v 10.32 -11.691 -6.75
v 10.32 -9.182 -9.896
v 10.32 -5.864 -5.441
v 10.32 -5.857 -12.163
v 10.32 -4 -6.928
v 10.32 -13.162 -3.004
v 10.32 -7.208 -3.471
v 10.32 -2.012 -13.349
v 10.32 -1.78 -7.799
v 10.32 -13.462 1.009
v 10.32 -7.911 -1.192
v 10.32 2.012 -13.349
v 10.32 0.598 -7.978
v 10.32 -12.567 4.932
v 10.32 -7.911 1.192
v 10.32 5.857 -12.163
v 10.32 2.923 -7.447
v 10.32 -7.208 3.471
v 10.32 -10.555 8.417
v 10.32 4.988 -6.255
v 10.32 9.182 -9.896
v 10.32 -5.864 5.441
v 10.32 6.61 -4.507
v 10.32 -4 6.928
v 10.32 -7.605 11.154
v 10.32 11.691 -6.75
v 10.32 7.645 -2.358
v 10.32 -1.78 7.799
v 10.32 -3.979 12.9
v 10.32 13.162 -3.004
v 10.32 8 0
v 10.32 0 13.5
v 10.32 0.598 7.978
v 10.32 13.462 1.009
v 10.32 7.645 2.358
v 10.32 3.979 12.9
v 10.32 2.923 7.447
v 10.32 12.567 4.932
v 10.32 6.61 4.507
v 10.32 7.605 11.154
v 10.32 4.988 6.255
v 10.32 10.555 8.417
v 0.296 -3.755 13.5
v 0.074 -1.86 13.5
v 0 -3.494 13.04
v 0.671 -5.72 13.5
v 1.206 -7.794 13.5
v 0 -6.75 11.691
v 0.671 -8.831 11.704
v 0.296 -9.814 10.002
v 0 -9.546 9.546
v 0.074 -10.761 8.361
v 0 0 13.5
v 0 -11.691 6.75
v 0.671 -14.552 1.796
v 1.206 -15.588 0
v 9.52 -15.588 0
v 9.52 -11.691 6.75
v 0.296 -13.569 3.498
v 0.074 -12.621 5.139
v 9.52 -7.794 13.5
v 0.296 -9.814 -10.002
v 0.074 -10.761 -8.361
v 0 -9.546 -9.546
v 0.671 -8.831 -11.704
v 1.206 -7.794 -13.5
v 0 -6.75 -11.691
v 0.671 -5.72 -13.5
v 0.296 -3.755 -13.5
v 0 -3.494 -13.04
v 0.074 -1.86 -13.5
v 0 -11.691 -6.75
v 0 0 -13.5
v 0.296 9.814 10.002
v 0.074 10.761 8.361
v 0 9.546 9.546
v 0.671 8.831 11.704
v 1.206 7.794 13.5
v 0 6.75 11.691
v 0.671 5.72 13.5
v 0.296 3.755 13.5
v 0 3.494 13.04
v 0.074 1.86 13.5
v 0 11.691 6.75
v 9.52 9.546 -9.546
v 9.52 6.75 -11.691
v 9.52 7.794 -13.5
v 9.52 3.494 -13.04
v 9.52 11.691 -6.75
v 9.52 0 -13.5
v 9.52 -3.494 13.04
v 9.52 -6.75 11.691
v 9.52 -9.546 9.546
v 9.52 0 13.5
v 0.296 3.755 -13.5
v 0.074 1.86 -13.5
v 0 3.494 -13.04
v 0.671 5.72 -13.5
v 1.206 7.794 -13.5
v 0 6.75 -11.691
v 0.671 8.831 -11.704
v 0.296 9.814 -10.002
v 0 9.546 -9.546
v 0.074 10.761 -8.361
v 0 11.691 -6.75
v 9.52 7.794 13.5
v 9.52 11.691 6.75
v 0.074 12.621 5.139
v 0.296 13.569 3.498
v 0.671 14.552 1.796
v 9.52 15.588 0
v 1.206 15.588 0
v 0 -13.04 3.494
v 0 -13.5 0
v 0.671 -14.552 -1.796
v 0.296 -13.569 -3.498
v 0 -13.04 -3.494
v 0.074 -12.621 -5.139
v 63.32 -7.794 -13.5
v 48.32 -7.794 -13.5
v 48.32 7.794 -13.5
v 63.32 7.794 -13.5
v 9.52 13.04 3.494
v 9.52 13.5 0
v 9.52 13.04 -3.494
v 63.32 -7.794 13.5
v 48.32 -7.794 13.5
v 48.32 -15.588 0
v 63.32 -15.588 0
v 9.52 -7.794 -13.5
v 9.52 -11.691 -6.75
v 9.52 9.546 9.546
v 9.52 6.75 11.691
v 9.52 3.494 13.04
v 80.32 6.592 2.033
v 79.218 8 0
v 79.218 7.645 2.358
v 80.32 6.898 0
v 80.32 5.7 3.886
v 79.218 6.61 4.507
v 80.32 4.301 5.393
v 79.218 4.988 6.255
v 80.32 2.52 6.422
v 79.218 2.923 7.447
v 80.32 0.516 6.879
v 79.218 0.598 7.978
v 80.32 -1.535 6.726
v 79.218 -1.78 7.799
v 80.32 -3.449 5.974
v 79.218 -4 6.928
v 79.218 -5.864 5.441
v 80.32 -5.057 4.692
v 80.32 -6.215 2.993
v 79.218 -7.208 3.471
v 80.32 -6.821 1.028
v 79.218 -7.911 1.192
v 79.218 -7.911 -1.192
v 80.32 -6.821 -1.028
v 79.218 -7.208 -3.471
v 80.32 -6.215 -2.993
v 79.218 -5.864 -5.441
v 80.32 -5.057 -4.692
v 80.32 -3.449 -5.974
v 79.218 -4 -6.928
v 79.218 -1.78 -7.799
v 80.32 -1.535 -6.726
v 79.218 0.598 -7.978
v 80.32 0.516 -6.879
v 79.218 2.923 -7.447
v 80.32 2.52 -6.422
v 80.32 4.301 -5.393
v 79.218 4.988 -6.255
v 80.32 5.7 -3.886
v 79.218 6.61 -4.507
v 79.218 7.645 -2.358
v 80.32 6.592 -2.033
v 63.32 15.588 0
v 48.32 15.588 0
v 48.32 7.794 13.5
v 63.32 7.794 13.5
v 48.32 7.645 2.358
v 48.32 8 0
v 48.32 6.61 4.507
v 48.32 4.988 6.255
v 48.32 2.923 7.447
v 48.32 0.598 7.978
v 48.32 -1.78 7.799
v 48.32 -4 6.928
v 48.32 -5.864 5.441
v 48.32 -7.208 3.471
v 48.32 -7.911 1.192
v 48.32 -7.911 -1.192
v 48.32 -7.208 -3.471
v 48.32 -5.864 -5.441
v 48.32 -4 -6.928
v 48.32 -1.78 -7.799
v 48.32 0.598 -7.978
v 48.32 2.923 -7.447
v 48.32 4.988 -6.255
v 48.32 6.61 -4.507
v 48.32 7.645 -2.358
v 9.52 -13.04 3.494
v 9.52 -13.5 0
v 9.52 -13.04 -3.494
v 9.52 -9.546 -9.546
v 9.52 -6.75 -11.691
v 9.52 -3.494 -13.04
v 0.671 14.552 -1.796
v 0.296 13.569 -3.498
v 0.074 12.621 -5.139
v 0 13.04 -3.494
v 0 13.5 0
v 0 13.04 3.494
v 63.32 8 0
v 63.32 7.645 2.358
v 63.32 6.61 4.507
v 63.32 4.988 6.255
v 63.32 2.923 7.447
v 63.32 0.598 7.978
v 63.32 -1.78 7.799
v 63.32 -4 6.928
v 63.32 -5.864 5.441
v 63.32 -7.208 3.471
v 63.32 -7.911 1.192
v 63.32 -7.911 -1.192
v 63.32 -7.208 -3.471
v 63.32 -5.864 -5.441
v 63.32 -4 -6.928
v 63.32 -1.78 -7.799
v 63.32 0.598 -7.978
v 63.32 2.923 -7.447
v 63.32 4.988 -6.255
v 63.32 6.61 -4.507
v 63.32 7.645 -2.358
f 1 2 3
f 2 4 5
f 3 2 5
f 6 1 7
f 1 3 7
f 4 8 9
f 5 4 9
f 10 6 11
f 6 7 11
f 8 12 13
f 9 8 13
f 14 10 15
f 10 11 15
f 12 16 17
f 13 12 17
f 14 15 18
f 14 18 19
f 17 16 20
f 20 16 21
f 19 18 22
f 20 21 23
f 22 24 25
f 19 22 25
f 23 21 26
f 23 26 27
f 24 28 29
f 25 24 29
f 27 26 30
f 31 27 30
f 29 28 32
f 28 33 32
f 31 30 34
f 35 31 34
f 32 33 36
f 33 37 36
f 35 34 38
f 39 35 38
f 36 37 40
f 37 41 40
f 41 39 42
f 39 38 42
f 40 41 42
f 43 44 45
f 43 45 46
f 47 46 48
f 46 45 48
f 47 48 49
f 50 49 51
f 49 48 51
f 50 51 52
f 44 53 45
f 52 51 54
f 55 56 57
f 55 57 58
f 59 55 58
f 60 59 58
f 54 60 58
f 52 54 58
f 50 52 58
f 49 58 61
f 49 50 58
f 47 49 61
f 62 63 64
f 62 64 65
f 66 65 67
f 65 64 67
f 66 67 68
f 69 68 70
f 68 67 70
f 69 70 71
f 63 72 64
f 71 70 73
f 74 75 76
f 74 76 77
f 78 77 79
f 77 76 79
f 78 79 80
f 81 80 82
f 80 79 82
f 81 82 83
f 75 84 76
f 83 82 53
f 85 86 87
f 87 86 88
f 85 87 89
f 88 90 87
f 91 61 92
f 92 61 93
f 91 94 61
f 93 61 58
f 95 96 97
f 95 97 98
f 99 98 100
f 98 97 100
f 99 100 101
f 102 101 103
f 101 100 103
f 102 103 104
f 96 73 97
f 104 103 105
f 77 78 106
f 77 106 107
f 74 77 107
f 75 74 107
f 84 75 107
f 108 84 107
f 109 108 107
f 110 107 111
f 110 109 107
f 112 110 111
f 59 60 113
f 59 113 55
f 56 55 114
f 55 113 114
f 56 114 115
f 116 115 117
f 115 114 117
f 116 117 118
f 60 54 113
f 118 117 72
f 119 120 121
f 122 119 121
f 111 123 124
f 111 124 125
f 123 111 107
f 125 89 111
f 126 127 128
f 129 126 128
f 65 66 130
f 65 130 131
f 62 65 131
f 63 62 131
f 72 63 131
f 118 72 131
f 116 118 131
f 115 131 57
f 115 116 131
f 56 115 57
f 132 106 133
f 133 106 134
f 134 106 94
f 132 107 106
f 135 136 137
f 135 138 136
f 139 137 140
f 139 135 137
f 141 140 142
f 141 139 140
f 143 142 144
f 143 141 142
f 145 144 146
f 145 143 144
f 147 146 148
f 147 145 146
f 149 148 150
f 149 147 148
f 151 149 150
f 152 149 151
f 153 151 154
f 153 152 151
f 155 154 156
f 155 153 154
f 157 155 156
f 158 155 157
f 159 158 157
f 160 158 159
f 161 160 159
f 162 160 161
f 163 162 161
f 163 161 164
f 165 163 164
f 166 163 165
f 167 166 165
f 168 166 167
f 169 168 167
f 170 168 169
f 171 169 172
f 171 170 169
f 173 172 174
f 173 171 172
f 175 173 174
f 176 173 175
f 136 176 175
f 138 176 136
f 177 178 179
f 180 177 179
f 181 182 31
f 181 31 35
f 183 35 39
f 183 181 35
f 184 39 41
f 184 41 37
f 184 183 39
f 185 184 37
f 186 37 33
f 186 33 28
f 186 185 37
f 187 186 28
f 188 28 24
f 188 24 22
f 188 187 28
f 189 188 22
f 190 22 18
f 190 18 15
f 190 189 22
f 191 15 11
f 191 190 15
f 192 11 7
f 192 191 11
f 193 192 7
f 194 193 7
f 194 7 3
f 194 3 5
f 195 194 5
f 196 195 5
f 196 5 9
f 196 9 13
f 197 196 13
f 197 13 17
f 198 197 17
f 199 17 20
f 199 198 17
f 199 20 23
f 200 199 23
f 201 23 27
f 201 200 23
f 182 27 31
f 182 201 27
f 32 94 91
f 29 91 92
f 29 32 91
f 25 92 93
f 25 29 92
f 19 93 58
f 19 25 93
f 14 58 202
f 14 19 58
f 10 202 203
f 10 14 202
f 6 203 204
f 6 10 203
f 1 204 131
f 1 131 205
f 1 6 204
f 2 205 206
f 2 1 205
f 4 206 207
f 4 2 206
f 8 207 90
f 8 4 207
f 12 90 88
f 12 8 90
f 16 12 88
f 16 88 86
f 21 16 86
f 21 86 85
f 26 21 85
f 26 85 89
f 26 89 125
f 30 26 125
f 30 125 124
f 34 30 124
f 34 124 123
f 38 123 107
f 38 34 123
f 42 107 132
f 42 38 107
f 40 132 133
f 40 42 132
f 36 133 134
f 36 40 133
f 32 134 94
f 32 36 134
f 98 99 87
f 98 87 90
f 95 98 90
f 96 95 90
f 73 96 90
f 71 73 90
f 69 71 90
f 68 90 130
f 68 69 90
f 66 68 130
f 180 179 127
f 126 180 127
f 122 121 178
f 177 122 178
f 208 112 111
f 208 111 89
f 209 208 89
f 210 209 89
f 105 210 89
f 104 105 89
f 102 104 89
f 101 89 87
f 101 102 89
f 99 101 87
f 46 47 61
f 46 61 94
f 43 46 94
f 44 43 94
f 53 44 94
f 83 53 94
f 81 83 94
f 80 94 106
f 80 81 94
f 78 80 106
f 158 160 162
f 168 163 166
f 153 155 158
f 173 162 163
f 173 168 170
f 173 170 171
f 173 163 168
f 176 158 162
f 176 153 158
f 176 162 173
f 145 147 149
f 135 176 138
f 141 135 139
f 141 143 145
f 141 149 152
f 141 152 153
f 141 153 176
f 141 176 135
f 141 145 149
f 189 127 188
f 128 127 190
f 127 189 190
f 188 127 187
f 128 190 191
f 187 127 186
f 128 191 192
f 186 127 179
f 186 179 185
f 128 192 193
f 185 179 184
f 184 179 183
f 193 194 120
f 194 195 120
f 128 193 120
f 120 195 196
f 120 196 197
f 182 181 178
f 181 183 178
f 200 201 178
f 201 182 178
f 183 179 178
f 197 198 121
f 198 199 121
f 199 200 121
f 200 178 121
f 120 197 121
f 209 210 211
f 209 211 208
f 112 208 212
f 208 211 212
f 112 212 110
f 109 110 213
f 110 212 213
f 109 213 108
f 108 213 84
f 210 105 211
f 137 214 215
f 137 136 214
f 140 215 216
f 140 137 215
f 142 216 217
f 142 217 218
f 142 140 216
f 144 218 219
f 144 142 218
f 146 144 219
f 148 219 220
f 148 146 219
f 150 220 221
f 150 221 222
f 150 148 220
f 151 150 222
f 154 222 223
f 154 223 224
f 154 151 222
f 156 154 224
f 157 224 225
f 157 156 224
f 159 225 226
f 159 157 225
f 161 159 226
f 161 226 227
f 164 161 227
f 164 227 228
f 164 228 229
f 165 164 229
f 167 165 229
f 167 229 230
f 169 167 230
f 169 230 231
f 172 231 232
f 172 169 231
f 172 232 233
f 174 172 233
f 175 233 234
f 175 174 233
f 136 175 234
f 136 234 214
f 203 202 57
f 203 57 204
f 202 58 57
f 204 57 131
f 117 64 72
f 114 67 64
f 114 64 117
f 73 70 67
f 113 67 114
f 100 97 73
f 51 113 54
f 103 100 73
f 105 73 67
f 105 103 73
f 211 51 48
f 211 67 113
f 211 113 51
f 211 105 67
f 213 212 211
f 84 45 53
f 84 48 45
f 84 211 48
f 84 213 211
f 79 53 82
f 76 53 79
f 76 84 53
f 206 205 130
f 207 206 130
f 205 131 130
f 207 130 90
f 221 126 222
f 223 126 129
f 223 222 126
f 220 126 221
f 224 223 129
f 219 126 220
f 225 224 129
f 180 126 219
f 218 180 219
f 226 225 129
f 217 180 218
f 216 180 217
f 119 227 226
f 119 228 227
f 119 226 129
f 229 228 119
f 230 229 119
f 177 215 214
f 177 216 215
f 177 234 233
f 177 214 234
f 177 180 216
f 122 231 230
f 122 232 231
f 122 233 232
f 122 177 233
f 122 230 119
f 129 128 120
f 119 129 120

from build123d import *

# Parameters (mm, degrees)
BASEHEAD_DEPTH      = 10.32
SKETCH4_W           = 0.8
SKETCH4_H           = 12.088457268
BOSS_EXTRUDE2_DEPTH = 15


# Read off the part's stored shape, not the designer's step: HeadChamfer
with BuildPart() as part:
    # Sketch1 → BaseHead (new body)
    with BuildSketch(Plane(origin=(0, 0, 0), x_dir=(0, 0, -1), z_dir=(1, 0, 0))):
        Polygon((13.5, 7.794228634), (13.5, -7.794228634), (0, -15.588457268), (-13.5, -7.794228634), (-13.5, 7.794228634), (0, 15.588457268), align=None)
    extrude(amount=BASEHEAD_DEPTH)

    # HeadChamfer outline → HeadChamfer (revolve, cut)
    with BuildSketch(Plane.YX):
        Polygon((15.58845727, 1.205771367), (13.499999851, -8.6e-08), (15.58845727, -8.6e-08), align=None)
    revolve(axis=Axis((0, 0, 0), (1, 0, 0)), mode=Mode.SUBTRACT)

    # HeadChamfer 2 outline → HeadChamfer 2 (revolve)
    with BuildSketch(Plane.YX):
        Polygon((8, 10.32), (8, 79.2185), (6.8985, 80.32), (0, 80.32), (0, 10.32), align=None)
    revolve(axis=Axis((0, 0, 0), (1, 0, 0)))

    # Sketch4 → BearingFace (revolve, cut)
    with BuildSketch(Plane.XY, mode=Mode.PRIVATE) as bearingface_sk:
        with Locations((9.92, 19.544228634)):
            Rectangle(SKETCH4_W, SKETCH4_H)
    revolve(bearingface_sk.sketch.rotate(Axis((0, 0, 0), (1, 0, 0)), 90), axis=Axis((0, 0, 0), (1, 0, 0)), mode=Mode.SUBTRACT)

    # Sketch6 → Boss-Extrude2 (add)
    with BuildSketch(Plane(origin=(48.32, 0, 0), x_dir=(0, 0, -1), z_dir=(1, 0, 0))):
        Polygon((0, 15.588457268), (-13.5, 7.794228634), (-13.5, -7.794228634), (0, -15.588457268), (13.5, -7.794228634), (13.5, 7.794228634), align=None)
    extrude(amount=BOSS_EXTRUDE2_DEPTH)


solid = part.part
